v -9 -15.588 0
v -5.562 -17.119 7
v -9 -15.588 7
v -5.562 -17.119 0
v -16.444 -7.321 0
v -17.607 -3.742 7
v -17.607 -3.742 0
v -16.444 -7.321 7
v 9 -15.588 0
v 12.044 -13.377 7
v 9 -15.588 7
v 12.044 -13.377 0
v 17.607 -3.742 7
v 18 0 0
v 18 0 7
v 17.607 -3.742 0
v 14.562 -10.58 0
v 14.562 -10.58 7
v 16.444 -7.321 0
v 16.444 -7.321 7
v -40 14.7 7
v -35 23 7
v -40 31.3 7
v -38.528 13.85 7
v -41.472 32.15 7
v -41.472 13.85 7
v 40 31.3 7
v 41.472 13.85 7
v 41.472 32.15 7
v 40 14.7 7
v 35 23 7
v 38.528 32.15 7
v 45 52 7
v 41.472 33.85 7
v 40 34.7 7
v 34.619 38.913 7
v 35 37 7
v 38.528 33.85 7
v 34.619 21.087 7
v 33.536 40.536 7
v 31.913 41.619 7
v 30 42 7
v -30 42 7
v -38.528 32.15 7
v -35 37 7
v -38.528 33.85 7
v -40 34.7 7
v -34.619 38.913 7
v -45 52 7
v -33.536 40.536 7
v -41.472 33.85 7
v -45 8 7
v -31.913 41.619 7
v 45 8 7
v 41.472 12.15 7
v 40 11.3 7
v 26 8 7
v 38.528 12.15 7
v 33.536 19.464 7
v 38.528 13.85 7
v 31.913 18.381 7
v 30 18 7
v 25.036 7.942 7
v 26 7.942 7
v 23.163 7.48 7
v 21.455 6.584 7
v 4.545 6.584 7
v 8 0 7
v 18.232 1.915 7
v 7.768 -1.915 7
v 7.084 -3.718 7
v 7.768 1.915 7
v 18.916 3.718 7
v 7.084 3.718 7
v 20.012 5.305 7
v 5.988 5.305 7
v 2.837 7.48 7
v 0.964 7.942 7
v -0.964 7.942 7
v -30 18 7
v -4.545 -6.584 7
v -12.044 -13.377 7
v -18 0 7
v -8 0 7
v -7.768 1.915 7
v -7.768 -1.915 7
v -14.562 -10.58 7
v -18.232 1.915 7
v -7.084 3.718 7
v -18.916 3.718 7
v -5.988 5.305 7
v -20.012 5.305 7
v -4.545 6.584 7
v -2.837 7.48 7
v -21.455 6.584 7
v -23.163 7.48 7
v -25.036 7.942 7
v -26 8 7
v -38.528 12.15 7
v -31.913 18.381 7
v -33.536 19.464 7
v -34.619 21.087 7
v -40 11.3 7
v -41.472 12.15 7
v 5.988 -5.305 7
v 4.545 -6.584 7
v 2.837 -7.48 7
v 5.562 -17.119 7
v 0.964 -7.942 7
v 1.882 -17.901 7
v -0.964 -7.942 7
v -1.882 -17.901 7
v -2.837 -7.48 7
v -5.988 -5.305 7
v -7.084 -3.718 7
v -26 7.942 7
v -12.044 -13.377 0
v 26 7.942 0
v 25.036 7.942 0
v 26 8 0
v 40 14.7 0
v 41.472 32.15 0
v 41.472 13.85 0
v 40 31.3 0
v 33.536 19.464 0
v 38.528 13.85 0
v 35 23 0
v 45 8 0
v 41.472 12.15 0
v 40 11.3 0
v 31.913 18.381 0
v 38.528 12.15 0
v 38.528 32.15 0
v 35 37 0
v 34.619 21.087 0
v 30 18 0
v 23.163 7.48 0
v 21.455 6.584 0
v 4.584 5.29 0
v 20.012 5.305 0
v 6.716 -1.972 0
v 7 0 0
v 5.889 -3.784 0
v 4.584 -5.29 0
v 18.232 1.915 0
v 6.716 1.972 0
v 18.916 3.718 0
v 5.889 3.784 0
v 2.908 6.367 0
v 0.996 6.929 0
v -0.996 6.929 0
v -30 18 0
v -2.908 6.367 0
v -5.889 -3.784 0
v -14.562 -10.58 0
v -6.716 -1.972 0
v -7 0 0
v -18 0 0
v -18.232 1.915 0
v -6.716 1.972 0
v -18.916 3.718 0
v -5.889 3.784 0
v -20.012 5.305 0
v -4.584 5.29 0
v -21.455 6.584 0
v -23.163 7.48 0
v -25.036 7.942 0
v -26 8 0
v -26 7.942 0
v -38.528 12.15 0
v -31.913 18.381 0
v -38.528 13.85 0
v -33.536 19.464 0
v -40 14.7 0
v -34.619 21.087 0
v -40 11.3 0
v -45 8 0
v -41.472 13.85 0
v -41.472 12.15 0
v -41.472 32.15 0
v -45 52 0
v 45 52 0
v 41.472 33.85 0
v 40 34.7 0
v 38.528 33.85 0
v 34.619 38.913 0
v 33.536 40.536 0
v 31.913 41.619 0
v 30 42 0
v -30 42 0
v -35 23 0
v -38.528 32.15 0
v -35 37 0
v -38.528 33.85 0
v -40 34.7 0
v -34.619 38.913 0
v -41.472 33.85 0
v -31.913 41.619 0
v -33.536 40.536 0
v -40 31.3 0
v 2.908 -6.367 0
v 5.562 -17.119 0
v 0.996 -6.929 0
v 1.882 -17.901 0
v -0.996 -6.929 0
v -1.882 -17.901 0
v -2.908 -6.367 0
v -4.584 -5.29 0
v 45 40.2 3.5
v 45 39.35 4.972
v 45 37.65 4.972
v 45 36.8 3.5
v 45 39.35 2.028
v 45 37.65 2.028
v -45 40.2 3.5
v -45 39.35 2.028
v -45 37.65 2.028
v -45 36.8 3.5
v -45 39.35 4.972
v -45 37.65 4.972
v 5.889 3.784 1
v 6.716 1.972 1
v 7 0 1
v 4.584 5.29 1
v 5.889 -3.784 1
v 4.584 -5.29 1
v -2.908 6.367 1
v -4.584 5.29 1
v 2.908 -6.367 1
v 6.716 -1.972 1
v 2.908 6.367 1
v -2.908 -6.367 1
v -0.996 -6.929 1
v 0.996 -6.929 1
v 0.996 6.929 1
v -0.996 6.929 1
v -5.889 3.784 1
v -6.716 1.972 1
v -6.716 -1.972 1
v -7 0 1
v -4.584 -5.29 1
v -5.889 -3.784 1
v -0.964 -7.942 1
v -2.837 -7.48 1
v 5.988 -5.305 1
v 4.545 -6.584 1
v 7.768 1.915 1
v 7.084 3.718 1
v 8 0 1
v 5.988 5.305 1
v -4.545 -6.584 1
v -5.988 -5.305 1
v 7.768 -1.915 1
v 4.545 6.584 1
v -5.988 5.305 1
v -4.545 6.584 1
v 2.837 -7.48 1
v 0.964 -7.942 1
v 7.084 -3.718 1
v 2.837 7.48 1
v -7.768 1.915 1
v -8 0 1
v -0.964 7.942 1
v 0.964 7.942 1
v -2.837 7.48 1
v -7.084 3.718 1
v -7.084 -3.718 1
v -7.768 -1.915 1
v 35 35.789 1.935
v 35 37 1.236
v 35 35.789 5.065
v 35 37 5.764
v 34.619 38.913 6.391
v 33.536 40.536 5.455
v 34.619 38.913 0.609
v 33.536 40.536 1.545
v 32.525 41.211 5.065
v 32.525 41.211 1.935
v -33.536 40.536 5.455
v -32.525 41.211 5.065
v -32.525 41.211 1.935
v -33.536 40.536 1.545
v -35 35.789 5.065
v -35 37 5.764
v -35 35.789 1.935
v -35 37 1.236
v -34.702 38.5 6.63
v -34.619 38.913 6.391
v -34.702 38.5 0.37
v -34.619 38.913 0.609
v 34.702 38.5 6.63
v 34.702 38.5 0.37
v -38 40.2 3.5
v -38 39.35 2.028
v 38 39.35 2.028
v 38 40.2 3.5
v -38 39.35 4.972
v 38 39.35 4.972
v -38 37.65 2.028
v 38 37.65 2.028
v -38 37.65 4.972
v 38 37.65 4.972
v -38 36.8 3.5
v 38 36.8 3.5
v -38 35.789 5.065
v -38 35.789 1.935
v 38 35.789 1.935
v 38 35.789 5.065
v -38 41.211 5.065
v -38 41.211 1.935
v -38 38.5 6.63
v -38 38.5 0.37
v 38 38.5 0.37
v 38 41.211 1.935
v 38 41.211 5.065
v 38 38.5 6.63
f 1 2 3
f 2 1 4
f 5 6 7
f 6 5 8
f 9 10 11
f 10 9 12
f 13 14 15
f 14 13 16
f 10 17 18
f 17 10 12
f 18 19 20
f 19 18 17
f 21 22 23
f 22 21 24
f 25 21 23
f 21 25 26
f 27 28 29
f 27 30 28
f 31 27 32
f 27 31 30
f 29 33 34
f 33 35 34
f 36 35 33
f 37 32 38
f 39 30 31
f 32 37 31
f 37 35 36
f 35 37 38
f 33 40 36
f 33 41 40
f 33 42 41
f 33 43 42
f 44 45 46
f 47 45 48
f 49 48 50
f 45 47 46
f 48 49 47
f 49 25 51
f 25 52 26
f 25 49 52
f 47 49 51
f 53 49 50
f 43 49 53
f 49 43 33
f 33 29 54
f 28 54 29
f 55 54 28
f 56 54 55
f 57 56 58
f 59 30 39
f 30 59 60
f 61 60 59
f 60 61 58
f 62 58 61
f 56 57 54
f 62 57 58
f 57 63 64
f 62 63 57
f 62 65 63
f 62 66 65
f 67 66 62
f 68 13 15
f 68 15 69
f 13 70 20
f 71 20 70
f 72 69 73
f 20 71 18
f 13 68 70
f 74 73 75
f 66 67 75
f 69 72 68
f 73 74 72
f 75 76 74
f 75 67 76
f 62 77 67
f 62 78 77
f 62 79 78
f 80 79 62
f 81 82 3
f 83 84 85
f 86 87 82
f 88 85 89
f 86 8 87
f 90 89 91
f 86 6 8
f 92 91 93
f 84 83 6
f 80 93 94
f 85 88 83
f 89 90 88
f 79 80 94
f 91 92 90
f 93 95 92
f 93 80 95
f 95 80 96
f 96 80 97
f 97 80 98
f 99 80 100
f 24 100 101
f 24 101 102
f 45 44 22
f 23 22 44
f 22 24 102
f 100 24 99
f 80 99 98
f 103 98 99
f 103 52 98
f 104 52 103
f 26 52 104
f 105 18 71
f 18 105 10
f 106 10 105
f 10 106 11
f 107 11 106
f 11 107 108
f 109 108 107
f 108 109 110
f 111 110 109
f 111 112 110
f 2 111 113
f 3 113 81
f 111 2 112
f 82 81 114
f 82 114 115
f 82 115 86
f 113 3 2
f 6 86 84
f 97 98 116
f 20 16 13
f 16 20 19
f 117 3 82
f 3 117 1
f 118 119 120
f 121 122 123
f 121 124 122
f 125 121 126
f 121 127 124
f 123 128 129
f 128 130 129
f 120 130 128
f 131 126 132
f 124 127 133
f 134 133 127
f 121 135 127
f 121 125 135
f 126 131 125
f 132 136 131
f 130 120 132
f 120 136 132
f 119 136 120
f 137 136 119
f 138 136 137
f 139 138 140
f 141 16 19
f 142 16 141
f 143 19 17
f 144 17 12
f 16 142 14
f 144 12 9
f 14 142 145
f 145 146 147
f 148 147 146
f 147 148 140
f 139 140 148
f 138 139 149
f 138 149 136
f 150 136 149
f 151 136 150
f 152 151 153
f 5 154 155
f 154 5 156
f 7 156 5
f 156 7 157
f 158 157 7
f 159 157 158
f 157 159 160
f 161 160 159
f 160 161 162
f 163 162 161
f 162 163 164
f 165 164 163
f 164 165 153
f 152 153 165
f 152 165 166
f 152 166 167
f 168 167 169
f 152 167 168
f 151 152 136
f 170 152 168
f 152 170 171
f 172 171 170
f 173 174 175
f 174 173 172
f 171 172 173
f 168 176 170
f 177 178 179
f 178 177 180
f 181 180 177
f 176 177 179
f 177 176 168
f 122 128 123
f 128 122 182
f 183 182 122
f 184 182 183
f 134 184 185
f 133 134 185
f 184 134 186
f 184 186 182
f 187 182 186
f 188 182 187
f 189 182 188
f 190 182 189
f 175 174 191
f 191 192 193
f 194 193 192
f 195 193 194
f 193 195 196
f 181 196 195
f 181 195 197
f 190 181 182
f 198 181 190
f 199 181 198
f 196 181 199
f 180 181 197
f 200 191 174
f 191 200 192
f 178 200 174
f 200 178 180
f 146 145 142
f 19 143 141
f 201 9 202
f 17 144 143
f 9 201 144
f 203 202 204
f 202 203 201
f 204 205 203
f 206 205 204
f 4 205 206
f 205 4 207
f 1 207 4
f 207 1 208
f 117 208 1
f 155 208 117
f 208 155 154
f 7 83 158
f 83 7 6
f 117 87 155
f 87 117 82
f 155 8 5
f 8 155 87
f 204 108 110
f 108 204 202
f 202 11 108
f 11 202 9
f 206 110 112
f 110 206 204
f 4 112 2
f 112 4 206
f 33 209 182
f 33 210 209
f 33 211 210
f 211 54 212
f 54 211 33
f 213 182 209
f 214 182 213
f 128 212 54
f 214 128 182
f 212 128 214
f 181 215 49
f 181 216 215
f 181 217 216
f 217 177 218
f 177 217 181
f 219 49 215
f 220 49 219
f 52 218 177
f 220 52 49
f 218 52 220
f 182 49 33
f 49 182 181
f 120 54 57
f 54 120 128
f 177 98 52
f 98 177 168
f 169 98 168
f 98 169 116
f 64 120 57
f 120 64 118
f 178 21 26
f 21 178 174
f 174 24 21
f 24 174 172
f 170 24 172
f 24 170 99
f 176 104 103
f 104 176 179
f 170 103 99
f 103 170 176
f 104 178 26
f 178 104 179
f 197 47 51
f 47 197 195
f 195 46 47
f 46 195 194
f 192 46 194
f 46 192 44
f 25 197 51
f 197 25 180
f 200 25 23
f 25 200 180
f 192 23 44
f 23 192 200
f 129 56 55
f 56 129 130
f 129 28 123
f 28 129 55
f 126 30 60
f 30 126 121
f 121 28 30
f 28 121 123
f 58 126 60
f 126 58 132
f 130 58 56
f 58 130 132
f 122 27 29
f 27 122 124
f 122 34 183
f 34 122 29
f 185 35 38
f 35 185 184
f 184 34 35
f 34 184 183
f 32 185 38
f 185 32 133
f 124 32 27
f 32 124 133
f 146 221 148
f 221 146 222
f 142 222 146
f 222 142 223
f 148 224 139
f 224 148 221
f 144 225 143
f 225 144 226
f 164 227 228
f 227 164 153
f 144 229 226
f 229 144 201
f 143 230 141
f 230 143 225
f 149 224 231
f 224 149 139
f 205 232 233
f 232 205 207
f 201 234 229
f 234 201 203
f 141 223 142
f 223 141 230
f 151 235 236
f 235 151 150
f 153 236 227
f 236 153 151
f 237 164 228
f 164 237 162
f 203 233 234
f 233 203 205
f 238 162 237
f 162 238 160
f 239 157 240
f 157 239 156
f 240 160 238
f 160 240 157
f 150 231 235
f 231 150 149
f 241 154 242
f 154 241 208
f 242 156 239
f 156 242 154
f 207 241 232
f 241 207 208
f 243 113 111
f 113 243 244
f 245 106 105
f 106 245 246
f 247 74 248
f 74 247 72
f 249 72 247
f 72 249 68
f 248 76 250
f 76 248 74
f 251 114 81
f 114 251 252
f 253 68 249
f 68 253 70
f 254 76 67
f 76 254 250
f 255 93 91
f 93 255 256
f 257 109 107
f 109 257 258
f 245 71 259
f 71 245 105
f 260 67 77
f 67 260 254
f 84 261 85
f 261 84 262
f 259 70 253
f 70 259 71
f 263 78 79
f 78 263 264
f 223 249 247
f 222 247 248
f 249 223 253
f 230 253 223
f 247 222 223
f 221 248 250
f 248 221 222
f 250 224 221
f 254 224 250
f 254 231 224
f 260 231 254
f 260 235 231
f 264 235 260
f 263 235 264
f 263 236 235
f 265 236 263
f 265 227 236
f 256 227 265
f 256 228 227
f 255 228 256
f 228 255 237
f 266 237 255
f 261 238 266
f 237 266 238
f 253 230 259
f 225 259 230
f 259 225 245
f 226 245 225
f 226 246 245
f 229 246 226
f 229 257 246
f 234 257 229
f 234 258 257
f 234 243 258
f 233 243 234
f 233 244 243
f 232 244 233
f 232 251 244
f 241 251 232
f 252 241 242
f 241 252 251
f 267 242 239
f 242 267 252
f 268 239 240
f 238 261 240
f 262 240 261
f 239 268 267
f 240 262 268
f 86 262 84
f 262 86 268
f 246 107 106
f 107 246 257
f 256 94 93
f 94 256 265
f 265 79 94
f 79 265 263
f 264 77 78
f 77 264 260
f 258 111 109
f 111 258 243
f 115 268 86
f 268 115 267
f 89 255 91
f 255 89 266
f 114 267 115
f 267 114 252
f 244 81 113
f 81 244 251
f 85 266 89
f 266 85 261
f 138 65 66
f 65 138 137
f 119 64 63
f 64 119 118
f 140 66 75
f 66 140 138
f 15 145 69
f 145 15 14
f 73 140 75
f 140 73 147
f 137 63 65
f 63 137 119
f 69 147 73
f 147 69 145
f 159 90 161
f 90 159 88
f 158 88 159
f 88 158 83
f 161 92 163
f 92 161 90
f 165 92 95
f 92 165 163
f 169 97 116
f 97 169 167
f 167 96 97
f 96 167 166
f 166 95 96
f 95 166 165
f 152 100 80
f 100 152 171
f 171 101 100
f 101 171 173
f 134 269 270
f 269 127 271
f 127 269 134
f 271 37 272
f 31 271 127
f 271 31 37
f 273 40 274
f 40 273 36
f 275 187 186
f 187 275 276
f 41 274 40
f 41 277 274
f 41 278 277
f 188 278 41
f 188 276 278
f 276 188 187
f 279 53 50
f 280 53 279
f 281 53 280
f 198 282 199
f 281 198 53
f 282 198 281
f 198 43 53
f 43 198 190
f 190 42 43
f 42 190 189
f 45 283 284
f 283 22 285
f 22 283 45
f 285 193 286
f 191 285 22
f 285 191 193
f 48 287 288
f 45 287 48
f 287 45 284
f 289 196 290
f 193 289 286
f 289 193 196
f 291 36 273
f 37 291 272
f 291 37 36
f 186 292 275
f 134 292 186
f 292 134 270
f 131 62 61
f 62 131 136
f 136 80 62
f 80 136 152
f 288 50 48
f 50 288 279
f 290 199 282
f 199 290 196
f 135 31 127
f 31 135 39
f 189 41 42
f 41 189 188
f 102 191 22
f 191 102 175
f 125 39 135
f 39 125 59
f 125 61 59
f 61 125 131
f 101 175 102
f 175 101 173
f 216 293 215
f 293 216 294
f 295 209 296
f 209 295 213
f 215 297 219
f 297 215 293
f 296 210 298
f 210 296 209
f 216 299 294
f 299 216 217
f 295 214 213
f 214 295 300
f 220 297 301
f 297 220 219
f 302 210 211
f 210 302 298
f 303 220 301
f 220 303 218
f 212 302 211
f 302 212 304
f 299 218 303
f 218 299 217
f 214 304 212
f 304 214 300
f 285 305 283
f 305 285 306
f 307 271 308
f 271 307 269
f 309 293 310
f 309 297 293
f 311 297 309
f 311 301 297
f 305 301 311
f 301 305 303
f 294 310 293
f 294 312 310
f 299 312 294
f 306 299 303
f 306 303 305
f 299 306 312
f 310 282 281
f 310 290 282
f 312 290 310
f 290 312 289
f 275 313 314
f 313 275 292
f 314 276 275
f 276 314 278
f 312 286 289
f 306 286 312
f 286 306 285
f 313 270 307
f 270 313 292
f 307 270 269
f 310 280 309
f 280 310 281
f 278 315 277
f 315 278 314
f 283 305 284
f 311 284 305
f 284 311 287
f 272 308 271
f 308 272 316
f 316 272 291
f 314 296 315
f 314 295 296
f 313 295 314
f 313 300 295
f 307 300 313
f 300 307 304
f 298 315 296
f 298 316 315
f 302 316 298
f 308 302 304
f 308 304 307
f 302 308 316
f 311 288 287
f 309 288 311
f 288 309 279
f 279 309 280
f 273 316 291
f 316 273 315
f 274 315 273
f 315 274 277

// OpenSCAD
// file: constants.scad
/* sinusoid-plotter: A parametric sinusoid plotter made with OpenSCAD.
 * Copyright (C) 2013  Clayton G. Hobbs
 * 
 * This program is free software: you can redistribute it and/or modify
 * it under the terms of the GNU General Public License as published by
 * the Free Software Foundation, either version 3 of the License, or
 * (at your option) any later version.
 * 
 * This program is distributed in the hope that it will be useful,
 * but WITHOUT ANY WARRANTY; without even the implied warranty of
 * MERCHANTABILITY or FITNESS FOR A PARTICULAR PURPOSE.  See the
 * GNU General Public License for more details.
 * 
 * You should have received a copy of the GNU General Public License
 * along with this program.  If not, see <http://www.gnu.org/licenses/>.
 */

pi = 3.1415926535897932384626433832795;
// main file
/* sinusoid-plotter: A parametric sinusoid plotter made with OpenSCAD.
 * Copyright (C) 2013  Clayton G. Hobbs
 * 
 * This program is free software: you can redistribute it and/or modify
 * it under the terms of the GNU General Public License as published by
 * the Free Software Foundation, either version 3 of the License, or
 * (at your option) any later version.
 * 
 * This program is distributed in the hope that it will be useful,
 * but WITHOUT ANY WARRANTY; without even the implied warranty of
 * MERCHANTABILITY or FITNESS FOR A PARTICULAR PURPOSE.  See the
 * GNU General Public License for more details.
 * 
 * You should have received a copy of the GNU General Public License
 * along with this program.  If not, see <http://www.gnu.org/licenses/>.
 */

include <constants.scad>;

module side(size, bar_thickness, bearing_radius, bearing_rim,
            bearing_thickness, spacer_hole_width, spacer_hole_radius,
            top_hole, channel_hole)
{
	difference() {
		// Main body
		union() {
			// Main circle around the bearing
			cylinder(r = bearing_radius + bar_thickness, h = size[2]);

			// Horizontal bar at the top of the bearing circle
			translate([-size[0]/2, bearing_radius,
                       0])
			cube([size[0], size[1] - bar_thickness - 2*bearing_radius,
                  size[2]]);

			// Blocks to fill the space where the bearing meets the bar
			translate([-2*bearing_radius - bar_thickness, 0, 0])
			cube([bar_thickness + bearing_radius, bearing_radius, size[2]]);

			translate([bearing_radius, 0, 0])
			cube([bar_thickness + bearing_radius, bearing_radius, size[2]]);
		}
*		translate([-size[0]/2, -bar_thickness - bearing_radius, 0])
		cube(size);

		// Smaller bearing hole
		translate([0, 0, -1])
		cylinder(r = bearing_radius - bearing_rim, h = size[2] + 2);

		// Larger bearing hole
		translate([0, 0, (size[2] - bearing_thickness)/2])
		cylinder(r = bearing_radius, h = size[2]);

		// Cutouts where the bearing meets the bar
		translate([2*bearing_radius + bar_thickness, 0, -1])
		cylinder(r = bearing_radius, h = size[2] + 2);

		translate([-2*bearing_radius - bar_thickness, 0, -1])
		cylinder(r = bearing_radius, h = size[2] + 2);

		// Cutout to form the bars around the top
		minkowski() {
			translate([-size[0]/2 + 1.5*bar_thickness,
                       bearing_radius + 1.5*bar_thickness, 0])
			cube([size[0] - 3*bar_thickness,
                  size[1] - 4*bar_thickness - 2*bearing_radius, size[2]]);

			cylinder(r = 0.5*bar_thickness, h = size[2], center=true);
		}

		// H-beam holes
		for (x = [(-size[0] + bar_thickness)/2, (size[0] - bar_thickness)/2]) {
			for (y = [bearing_radius +
                      bar_thickness/2, bearing_radius
                      + bar_thickness/2 + top_hole]) {
				translate([x, y, -1])
				rotate([0, 0, 30])
				cylinder(r = spacer_hole_radius, h = size[2] + 2);
			}
		}

		// Channel holes
		translate([0, bearing_radius + bar_thickness/2 + channel_hole,
                   size[2]/2])
		rotate([30, 0, 0])
		rotate([0, 90, 0])
		cylinder(r = spacer_hole_radius, h = size[0] + 2, center=true);

		// Channel nuts
		translate([0, bearing_radius + bar_thickness/2 + channel_hole,
                   size[2]/2])
		rotate([0, 90, 0])
		cylinder(r = nut_radius,
                 h = size[0] - 2*bar_thickness + 2*nut_thickness, center=true,
                 $fn = 6);
	}
}

side(size = [90, 70, 7], bar_thickness = 10, bearing_radius = 8,
     bearing_rim = 1, bearing_thickness = 5, spacer_hole_width = 80,
     spacer_hole_radius = 1.7, top_hole = 20, channel_hole = 25.5,
     nut_radius = 3.13, nut_thickness = 3);
